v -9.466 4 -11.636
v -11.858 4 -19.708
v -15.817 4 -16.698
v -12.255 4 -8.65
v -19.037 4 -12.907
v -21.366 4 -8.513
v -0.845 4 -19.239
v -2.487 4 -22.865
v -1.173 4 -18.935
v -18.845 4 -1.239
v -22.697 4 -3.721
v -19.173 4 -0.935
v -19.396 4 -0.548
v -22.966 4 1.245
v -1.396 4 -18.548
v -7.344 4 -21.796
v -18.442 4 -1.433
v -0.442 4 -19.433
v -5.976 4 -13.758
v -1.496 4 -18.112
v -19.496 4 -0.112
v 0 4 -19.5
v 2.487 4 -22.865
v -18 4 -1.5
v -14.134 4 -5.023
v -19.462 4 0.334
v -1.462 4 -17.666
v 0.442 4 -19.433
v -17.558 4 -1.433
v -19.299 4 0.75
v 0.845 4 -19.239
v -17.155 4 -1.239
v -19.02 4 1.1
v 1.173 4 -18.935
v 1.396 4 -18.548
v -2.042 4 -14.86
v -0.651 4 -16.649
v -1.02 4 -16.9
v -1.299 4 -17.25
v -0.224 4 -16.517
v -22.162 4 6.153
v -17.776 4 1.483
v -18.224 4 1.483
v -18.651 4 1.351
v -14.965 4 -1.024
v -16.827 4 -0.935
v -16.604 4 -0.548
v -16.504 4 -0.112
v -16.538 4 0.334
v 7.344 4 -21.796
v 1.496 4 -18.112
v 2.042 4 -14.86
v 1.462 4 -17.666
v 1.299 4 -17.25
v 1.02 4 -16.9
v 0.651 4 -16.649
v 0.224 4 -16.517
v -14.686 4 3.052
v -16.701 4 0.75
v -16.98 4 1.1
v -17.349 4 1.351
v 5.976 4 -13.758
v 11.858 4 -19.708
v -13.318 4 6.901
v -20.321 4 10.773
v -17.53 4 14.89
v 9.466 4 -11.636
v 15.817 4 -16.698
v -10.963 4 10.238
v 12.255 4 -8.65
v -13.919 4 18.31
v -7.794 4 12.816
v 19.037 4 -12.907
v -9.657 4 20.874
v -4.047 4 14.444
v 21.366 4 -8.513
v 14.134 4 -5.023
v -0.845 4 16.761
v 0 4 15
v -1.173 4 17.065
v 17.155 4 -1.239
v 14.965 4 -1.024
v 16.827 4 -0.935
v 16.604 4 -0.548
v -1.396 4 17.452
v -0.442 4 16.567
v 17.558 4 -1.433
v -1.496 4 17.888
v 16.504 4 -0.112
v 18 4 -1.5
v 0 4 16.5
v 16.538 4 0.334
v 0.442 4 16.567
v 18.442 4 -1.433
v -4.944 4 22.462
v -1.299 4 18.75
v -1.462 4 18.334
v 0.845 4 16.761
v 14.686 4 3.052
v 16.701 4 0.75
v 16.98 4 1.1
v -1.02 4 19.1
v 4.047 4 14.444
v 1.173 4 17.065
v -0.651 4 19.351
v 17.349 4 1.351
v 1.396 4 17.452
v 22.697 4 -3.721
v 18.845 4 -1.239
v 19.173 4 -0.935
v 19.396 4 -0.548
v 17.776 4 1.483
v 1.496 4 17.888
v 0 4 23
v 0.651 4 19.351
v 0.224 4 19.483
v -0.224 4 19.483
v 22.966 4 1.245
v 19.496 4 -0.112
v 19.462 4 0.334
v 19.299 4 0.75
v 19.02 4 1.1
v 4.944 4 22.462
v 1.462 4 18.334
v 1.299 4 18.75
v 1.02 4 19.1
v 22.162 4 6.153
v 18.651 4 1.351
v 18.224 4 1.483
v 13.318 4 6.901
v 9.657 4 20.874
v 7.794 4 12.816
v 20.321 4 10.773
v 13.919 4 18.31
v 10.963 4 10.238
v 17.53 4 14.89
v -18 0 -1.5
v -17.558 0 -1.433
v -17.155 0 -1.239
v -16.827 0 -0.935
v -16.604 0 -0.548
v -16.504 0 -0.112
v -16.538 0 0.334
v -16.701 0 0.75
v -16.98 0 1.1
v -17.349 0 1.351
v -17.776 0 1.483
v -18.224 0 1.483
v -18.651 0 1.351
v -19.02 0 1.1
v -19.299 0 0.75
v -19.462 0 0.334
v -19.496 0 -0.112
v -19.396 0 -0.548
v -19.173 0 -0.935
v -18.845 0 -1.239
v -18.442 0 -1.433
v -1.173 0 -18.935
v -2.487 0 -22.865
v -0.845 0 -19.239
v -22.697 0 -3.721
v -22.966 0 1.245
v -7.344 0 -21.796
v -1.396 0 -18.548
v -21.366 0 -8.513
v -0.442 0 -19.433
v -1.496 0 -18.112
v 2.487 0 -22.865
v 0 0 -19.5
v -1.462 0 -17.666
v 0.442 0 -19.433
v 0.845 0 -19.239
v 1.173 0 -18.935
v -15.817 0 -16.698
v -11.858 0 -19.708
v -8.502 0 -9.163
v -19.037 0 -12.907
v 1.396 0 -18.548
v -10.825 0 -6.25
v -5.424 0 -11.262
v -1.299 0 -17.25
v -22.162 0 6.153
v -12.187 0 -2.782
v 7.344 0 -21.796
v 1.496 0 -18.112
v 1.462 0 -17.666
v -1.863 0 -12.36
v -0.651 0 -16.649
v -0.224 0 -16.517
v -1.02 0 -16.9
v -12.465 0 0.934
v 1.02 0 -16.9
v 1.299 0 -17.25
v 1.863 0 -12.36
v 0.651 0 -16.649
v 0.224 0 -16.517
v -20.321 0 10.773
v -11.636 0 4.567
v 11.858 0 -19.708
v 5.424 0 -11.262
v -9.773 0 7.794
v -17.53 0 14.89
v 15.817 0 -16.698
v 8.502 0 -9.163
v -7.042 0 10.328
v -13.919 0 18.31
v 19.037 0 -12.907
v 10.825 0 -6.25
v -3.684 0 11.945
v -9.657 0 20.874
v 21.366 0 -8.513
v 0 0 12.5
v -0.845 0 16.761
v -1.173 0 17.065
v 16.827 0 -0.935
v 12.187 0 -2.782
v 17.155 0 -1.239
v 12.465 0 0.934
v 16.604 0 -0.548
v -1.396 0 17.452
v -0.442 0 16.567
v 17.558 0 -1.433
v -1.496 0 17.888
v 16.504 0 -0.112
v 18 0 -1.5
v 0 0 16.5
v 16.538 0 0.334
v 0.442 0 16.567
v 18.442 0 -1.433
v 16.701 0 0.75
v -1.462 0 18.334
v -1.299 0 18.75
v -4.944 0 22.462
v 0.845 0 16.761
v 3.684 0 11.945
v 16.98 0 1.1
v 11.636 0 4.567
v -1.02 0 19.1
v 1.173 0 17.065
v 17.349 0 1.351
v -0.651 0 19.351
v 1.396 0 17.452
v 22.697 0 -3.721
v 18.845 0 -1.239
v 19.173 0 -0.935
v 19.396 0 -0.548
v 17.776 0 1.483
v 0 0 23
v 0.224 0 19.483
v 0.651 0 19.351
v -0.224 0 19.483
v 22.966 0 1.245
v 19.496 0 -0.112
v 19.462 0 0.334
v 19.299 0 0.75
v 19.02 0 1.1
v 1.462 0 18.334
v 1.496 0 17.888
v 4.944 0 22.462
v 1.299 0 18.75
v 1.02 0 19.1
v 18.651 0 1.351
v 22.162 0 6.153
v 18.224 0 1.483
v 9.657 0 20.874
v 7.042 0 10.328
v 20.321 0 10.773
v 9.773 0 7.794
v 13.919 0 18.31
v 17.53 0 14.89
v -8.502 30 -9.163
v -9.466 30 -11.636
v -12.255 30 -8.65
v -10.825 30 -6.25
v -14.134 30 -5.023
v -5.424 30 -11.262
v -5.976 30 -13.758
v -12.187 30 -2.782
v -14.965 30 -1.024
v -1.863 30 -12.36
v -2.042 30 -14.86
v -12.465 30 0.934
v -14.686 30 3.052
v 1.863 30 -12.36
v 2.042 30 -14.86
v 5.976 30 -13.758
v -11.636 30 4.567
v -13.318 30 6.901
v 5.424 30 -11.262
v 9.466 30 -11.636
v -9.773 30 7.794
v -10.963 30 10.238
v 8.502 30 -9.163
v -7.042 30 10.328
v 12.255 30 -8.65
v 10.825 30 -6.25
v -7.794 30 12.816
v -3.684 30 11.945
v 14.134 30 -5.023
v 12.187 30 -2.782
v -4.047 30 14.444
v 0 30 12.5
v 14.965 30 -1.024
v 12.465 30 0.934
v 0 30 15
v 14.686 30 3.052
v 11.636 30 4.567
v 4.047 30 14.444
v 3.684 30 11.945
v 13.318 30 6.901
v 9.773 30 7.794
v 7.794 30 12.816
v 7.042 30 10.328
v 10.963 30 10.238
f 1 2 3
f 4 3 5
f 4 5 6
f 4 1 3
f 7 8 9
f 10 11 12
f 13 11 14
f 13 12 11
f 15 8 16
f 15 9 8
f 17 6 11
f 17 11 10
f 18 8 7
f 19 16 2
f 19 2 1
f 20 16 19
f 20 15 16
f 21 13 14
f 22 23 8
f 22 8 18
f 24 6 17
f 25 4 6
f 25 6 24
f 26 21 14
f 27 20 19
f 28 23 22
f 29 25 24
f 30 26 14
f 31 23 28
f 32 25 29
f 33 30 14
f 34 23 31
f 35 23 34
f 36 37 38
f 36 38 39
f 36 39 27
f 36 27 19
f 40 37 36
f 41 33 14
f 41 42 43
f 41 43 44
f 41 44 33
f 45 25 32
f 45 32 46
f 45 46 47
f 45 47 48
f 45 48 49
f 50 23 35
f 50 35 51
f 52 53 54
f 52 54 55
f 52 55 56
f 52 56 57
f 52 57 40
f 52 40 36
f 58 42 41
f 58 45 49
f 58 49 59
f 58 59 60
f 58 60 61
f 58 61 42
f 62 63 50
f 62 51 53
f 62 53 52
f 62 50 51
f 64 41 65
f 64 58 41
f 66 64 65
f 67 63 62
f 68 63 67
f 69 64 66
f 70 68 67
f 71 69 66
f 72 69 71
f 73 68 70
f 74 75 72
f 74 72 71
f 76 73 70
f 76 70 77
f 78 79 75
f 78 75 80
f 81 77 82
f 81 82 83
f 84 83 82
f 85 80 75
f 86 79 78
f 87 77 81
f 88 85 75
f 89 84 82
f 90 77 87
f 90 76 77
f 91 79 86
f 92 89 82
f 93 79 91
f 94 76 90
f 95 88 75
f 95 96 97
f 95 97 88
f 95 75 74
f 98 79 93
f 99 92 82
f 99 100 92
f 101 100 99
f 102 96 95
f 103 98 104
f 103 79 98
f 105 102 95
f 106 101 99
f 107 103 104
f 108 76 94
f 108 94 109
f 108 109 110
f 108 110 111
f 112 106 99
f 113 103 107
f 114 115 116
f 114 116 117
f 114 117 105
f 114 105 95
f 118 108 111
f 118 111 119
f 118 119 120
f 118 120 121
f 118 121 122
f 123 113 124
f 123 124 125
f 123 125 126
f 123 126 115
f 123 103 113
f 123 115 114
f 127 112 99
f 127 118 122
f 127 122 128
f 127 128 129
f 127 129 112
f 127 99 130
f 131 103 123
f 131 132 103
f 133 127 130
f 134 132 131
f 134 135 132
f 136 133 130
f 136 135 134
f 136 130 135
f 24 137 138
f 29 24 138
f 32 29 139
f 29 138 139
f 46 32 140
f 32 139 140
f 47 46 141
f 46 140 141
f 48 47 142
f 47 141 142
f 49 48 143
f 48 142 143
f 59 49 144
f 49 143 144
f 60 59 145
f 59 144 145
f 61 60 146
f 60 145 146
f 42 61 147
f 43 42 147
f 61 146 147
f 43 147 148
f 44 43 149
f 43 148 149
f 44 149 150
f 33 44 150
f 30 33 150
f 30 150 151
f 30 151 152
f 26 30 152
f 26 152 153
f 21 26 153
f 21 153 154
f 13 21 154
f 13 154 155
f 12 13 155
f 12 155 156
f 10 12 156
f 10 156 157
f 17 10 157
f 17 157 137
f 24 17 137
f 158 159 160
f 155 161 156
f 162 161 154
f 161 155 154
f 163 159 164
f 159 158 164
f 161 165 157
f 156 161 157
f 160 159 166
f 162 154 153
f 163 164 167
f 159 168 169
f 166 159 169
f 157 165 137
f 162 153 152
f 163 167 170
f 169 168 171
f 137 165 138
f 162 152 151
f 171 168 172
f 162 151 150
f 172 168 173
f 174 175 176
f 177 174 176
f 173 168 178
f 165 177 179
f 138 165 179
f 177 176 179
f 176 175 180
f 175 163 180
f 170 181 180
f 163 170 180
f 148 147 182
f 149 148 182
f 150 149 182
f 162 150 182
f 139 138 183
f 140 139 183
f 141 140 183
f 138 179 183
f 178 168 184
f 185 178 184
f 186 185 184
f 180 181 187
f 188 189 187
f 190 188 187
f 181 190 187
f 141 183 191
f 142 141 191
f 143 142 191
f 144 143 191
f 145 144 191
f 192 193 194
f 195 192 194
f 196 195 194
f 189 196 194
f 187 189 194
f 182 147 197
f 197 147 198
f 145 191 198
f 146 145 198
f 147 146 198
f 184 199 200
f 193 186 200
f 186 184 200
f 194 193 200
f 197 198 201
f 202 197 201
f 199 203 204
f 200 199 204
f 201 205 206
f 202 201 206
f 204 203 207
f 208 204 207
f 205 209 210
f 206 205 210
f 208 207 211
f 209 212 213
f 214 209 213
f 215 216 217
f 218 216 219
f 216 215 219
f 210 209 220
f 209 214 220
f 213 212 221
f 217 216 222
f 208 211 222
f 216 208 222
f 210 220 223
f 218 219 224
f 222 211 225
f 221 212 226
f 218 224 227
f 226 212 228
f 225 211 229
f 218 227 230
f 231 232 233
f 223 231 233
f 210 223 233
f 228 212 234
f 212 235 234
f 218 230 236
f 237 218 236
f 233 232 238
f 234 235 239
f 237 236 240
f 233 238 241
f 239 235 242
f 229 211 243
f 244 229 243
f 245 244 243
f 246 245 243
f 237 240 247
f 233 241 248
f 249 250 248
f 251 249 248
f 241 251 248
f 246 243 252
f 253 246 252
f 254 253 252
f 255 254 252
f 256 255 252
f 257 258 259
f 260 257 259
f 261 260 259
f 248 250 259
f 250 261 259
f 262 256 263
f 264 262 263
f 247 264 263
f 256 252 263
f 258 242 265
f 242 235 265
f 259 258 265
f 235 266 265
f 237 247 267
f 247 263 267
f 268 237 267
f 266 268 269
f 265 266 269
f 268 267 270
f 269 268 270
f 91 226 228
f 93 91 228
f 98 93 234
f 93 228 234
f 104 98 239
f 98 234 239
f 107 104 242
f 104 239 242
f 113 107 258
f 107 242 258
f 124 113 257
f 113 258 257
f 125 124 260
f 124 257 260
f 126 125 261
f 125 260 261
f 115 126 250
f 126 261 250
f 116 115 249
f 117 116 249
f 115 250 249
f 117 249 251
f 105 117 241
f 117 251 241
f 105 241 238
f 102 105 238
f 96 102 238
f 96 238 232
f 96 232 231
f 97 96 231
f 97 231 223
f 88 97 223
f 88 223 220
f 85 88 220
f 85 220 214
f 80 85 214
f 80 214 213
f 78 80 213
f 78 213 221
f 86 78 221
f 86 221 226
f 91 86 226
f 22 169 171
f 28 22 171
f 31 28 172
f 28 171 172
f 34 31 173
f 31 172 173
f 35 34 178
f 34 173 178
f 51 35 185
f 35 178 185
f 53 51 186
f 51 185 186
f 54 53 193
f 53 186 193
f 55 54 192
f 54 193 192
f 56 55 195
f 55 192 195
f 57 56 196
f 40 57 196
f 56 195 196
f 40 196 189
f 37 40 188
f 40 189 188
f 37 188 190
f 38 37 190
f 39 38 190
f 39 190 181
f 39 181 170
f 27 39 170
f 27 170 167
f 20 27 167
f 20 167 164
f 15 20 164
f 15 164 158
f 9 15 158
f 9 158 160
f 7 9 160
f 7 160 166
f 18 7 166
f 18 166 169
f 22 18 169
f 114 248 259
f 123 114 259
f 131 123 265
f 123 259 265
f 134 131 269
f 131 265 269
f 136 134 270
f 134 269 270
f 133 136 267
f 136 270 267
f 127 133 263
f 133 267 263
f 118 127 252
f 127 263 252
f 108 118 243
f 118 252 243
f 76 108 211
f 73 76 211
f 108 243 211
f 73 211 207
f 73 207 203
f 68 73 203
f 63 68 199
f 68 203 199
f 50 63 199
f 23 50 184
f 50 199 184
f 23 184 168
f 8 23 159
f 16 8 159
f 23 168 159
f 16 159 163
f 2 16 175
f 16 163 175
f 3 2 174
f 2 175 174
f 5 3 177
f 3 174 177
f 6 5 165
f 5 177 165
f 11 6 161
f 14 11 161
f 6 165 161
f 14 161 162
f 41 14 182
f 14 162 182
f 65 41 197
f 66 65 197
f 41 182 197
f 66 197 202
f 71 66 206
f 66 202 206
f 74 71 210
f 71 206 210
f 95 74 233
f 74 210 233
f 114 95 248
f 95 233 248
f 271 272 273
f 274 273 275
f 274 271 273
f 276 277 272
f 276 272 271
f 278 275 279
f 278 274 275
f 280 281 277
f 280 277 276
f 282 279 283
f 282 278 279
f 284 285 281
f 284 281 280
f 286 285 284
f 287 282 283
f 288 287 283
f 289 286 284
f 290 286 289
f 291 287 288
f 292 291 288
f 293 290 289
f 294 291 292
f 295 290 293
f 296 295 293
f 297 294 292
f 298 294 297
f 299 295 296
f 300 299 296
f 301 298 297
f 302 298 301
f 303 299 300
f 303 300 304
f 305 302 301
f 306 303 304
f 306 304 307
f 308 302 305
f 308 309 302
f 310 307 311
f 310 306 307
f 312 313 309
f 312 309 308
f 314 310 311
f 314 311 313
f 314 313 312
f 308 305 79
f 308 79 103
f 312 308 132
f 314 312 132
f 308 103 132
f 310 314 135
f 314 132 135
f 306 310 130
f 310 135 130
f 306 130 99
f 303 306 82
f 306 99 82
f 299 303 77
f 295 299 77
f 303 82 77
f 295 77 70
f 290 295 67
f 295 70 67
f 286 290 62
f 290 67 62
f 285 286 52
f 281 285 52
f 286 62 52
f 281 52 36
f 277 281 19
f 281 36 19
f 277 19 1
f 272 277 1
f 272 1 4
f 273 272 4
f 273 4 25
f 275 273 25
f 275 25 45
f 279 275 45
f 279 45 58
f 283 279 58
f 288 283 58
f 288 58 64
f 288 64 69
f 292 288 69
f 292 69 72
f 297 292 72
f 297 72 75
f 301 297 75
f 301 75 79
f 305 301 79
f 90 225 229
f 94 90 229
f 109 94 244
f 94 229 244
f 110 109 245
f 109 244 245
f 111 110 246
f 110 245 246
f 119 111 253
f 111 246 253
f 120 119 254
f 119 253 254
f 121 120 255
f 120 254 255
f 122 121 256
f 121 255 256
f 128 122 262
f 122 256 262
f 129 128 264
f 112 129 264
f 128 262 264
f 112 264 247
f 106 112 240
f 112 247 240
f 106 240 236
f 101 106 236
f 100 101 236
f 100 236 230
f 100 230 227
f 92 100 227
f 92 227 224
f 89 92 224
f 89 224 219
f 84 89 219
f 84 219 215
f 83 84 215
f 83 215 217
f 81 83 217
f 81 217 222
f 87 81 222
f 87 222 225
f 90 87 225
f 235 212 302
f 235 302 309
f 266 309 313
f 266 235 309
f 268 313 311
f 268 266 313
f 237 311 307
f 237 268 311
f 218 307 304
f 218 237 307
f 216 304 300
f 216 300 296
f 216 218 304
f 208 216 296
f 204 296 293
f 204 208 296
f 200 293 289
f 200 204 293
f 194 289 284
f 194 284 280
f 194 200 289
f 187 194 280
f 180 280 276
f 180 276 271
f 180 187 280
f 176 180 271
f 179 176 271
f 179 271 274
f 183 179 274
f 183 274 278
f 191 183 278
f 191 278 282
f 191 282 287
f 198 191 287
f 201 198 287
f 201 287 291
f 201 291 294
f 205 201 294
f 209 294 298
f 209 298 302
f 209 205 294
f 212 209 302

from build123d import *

# Parameters (mm, degrees)
SKETCH_1_R          = 15
SKETCH_1_R_2        = 12.5
EXTRUDE_1_DEPTH     = 30
SKETCH_1_3_R        = 23
SKETCH_1_3_R_2      = 15
EXTRUDE_2_DEPTH     = 4
CUT_EXTRUDE_3_REACH = 46.249
SKETCH_3_R          = 1.5


with BuildPart() as part:
    # 草图1 → 凸台-拉伸1 (new body)
    with BuildSketch(Plane(origin=(0, 0, 0), x_dir=(1, 0, 0), z_dir=(0, 1, 0))):
        Circle(SKETCH_1_R)
        Circle(SKETCH_1_R_2, mode=Mode.SUBTRACT)
    extrude(amount=EXTRUDE_1_DEPTH)

    # 草图1<3> → 凸台-拉伸2 (add)
    with BuildSketch(Plane(origin=(0, 0, 0), x_dir=(1, 0, 0), z_dir=(0, 1, 0))):
        Circle(SKETCH_1_3_R)
        Circle(SKETCH_1_3_R_2, mode=Mode.SUBTRACT)
    extrude(amount=EXTRUDE_2_DEPTH)

    # 草图3 → 切除-拉伸3 (cut, up to next)
    with BuildSketch(Plane.XZ, mode=Mode.PRIVATE) as cut_extrude_3_sk1:
        with Locations((0, 18)):
            Circle(SKETCH_3_R)
    cut_extrude_3_tool1 = extrude(cut_extrude_3_sk1.sketch, amount=-CUT_EXTRUDE_3_REACH, mode=Mode.PRIVATE) & part.part
    # 草图3 → 切除-拉伸3 (cut, up to next)
    with BuildSketch(Plane.XZ, mode=Mode.PRIVATE) as cut_extrude_3_sk2:
        with Locations((18, 0)):
            Circle(SKETCH_3_R)
    cut_extrude_3_tool2 = extrude(cut_extrude_3_sk2.sketch, amount=-CUT_EXTRUDE_3_REACH, mode=Mode.PRIVATE) & part.part
    # 草图3 → 切除-拉伸3 (cut, up to next)
    with BuildSketch(Plane.XZ, mode=Mode.PRIVATE) as cut_extrude_3_sk3:
        with Locations((0, -18)):
            Circle(SKETCH_3_R)
    cut_extrude_3_tool3 = extrude(cut_extrude_3_sk3.sketch, amount=-CUT_EXTRUDE_3_REACH, mode=Mode.PRIVATE) & part.part
    # 草图3 → 切除-拉伸3 (cut, up to next)
    with BuildSketch(Plane.XZ, mode=Mode.PRIVATE) as cut_extrude_3_sk4:
        with Locations((-18, 0)):
            Circle(SKETCH_3_R)
    cut_extrude_3_tool4 = extrude(cut_extrude_3_sk4.sketch, amount=-CUT_EXTRUDE_3_REACH, mode=Mode.PRIVATE) & part.part
    add(cut_extrude_3_tool1.solids().sort_by_distance((0, 0, 18))[0], mode=Mode.SUBTRACT)
    add(cut_extrude_3_tool2.solids().sort_by_distance((18, 0, 0))[0], mode=Mode.SUBTRACT)
    add(cut_extrude_3_tool3.solids().sort_by_distance((0, 0, -18))[0], mode=Mode.SUBTRACT)
    add(cut_extrude_3_tool4.solids().sort_by_distance((-18, 0, 0))[0], mode=Mode.SUBTRACT)


solid = part.part
